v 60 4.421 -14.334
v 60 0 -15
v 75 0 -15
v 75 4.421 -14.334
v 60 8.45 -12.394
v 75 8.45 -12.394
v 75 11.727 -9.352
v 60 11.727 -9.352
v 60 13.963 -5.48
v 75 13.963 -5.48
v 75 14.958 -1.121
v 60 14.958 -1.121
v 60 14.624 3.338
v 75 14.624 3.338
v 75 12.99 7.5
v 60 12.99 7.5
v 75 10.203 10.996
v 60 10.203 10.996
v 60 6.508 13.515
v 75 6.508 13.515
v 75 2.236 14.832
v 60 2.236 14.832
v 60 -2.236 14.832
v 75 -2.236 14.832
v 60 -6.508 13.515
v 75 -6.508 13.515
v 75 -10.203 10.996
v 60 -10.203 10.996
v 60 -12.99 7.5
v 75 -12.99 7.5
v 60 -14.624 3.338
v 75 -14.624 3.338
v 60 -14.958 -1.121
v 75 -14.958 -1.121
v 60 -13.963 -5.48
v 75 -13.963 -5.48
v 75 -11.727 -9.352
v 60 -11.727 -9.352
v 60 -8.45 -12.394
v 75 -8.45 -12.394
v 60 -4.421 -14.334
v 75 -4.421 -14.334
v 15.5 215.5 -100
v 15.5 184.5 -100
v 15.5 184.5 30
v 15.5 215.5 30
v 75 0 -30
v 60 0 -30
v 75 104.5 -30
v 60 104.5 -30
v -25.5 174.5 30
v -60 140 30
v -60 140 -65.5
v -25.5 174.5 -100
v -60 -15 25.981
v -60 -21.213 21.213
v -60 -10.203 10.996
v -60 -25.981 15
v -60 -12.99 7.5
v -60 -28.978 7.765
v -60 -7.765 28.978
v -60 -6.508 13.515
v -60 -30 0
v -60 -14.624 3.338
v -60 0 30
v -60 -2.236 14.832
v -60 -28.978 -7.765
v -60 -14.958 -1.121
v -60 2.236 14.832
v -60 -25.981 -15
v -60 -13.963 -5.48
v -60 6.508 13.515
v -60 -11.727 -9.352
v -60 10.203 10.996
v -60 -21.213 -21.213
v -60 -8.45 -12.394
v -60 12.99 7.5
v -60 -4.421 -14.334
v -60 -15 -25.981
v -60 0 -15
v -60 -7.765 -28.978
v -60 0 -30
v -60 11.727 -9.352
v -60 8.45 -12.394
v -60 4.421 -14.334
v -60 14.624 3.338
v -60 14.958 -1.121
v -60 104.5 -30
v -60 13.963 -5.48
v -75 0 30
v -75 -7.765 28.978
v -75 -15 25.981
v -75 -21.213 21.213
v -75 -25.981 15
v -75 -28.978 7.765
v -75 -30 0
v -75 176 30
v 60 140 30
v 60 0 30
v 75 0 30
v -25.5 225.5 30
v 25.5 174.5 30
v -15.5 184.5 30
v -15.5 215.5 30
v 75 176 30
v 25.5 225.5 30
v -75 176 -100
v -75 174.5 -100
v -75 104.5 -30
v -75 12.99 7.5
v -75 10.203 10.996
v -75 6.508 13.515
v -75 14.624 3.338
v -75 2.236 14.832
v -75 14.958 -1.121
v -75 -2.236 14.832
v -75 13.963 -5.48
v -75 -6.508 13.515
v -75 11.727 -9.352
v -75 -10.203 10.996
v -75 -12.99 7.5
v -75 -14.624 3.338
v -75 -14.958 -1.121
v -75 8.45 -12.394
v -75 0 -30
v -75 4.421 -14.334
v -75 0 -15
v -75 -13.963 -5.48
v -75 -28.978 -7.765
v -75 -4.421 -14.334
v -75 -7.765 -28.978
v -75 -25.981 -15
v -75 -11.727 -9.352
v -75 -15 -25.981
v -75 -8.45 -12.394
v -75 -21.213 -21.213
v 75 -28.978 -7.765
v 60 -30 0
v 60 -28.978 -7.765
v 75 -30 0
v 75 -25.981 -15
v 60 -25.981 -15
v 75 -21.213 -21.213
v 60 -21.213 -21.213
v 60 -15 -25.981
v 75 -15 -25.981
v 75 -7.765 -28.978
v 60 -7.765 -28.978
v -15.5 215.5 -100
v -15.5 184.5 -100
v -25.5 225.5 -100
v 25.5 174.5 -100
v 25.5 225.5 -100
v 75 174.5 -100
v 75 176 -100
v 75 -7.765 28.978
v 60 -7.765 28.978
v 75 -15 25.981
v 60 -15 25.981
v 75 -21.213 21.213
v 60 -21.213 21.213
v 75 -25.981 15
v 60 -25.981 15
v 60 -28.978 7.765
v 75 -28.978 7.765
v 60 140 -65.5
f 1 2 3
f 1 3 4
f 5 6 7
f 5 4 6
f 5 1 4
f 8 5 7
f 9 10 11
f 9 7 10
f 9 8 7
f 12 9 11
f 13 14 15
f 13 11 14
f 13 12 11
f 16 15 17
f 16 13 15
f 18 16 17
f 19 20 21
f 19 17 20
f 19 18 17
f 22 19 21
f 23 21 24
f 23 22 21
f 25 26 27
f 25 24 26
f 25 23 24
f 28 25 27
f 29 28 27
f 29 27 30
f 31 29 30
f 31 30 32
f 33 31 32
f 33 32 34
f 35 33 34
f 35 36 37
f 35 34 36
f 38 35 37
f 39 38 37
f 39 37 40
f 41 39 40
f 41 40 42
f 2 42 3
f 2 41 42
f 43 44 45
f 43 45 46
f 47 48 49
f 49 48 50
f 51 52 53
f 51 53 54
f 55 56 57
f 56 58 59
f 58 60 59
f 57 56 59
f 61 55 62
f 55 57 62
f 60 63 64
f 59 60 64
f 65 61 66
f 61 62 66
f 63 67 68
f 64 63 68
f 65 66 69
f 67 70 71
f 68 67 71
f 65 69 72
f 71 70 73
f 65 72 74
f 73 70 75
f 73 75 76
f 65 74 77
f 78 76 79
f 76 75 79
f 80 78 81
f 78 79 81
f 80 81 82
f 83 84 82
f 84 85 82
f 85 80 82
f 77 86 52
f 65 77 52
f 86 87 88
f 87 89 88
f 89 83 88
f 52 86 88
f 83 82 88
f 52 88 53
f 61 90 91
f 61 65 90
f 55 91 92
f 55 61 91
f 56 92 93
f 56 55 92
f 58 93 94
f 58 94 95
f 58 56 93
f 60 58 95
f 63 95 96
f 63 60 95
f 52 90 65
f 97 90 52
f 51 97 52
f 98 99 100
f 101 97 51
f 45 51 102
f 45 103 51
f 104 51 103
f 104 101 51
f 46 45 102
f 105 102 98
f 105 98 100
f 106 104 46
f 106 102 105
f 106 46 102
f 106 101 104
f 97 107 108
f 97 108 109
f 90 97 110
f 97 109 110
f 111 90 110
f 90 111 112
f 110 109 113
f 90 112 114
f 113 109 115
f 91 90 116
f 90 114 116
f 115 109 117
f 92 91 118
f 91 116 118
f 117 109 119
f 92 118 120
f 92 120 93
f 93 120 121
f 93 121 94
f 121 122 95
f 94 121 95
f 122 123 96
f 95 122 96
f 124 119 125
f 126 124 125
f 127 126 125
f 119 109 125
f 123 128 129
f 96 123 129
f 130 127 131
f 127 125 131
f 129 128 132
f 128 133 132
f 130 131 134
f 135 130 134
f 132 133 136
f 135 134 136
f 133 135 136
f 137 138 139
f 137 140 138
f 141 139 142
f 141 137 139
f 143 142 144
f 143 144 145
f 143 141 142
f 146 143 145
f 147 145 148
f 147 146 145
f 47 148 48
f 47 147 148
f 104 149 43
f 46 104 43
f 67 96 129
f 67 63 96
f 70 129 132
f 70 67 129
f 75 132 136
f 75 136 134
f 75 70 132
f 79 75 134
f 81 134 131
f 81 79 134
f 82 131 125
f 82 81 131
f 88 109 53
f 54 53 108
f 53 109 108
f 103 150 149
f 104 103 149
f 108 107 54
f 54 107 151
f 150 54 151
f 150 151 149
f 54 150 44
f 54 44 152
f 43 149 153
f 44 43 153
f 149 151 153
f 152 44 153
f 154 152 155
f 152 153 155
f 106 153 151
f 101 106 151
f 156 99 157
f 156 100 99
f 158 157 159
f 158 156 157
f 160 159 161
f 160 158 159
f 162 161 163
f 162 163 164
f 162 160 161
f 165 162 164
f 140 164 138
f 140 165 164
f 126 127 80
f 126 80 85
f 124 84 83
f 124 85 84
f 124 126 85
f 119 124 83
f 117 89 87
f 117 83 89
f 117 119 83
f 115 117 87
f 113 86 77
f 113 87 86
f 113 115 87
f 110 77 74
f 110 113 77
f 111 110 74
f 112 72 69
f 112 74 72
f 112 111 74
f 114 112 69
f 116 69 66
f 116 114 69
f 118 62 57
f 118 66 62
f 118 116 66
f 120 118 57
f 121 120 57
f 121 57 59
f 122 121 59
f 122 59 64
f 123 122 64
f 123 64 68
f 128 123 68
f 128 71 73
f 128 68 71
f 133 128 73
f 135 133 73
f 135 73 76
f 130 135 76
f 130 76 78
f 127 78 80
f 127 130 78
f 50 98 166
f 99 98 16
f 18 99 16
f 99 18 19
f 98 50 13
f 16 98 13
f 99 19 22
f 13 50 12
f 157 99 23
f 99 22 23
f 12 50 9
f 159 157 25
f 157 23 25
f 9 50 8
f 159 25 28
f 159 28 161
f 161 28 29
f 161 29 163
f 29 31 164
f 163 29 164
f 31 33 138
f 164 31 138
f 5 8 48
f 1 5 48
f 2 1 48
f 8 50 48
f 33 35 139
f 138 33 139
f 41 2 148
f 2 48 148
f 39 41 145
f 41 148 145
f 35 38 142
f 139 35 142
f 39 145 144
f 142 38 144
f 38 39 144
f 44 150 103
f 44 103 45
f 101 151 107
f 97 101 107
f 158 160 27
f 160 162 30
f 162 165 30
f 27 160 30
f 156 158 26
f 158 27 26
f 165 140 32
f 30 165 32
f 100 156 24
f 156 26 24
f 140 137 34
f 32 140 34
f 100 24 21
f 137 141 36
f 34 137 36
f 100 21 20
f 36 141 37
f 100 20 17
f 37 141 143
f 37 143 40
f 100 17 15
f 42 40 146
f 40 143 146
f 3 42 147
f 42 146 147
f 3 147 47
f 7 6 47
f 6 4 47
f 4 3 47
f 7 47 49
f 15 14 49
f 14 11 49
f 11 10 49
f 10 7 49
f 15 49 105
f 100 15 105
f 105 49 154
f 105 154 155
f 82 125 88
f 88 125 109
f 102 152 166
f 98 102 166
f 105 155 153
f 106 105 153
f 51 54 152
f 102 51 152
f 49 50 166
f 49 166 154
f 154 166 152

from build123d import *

# Parameters (mm, degrees)
BOSS_EXTRUDE1_DEPTH      = 30
BOSS_EXTRUDE1_DEPTH_BACK = 100
SKETCH2_W                = 31
SKETCH2_H                = 31
CUT_EXTRUDE1_DEPTH       = 258.827946507
CUT_EXTRUDE1_DEPTH_BACK  = 258.827946507
CUT_EXTRUDE2_DEPTH       = 258.827946507
CUT_EXTRUDE2_DEPTH_BACK  = 258.827946507
SKETCH4_R                = 15
FILLET1_R                = 30


with BuildPart() as part:
    # Sketch2 → Boss-Extrude1 (new, two sides: drawn at the far end of the back side and taken through both)
    with BuildSketch(Plane.XY.offset(-BOSS_EXTRUDE1_DEPTH_BACK)):
        Polygon((-25.5, 174.5), (25.5, 174.5), (60, 140), (60, -30), (75, -30), (75, 176), (25.5, 225.5), (-25.5, 225.5), (-75, 176), (-75, -30), (-60, -30), (-60, 140), align=None)
        with Locations((0, 200)):
            Rectangle(SKETCH2_W, SKETCH2_H, mode=Mode.SUBTRACT)
    extrude(amount=BOSS_EXTRUDE1_DEPTH + BOSS_EXTRUDE1_DEPTH_BACK)

    # Sketch3 → Cut-Extrude1 (cut, two sides: drawn at the far end of the back side and taken through both)
    with BuildSketch(Plane(origin=(0, 0, 0), x_dir=(0, 0, -1), z_dir=(1, 0, 0)).offset(-CUT_EXTRUDE1_DEPTH_BACK)):
        Polygon((30, -30), (30, 104.5), (100, 174.5), (100, -30), align=None)
    extrude(amount=CUT_EXTRUDE1_DEPTH + CUT_EXTRUDE1_DEPTH_BACK, mode=Mode.SUBTRACT)

    # Sketch4 → Cut-Extrude2 (cut, two sides: drawn at the far end of the back side and taken through both)
    with BuildSketch(Plane(origin=(0, 0, 0), x_dir=(0, 0, -1), z_dir=(1, 0, 0)).offset(-CUT_EXTRUDE2_DEPTH_BACK)):
        Circle(SKETCH4_R)
    extrude(amount=CUT_EXTRUDE2_DEPTH + CUT_EXTRUDE2_DEPTH_BACK, mode=Mode.SUBTRACT)

    # Fillet1
    fillet1_edges = [part.edges().sort_by_distance(p)[0] for p in [
        (67.5, -30, -30),
        (-67.5, -30, -30),
        (-67.5, -30, 30),
        (67.5, -30, 30),
    ]]
    fillet(fillet1_edges, radius=FILLET1_R - 0.0001)  # a hair under: the kernel refuses the full size


solid = part.part
